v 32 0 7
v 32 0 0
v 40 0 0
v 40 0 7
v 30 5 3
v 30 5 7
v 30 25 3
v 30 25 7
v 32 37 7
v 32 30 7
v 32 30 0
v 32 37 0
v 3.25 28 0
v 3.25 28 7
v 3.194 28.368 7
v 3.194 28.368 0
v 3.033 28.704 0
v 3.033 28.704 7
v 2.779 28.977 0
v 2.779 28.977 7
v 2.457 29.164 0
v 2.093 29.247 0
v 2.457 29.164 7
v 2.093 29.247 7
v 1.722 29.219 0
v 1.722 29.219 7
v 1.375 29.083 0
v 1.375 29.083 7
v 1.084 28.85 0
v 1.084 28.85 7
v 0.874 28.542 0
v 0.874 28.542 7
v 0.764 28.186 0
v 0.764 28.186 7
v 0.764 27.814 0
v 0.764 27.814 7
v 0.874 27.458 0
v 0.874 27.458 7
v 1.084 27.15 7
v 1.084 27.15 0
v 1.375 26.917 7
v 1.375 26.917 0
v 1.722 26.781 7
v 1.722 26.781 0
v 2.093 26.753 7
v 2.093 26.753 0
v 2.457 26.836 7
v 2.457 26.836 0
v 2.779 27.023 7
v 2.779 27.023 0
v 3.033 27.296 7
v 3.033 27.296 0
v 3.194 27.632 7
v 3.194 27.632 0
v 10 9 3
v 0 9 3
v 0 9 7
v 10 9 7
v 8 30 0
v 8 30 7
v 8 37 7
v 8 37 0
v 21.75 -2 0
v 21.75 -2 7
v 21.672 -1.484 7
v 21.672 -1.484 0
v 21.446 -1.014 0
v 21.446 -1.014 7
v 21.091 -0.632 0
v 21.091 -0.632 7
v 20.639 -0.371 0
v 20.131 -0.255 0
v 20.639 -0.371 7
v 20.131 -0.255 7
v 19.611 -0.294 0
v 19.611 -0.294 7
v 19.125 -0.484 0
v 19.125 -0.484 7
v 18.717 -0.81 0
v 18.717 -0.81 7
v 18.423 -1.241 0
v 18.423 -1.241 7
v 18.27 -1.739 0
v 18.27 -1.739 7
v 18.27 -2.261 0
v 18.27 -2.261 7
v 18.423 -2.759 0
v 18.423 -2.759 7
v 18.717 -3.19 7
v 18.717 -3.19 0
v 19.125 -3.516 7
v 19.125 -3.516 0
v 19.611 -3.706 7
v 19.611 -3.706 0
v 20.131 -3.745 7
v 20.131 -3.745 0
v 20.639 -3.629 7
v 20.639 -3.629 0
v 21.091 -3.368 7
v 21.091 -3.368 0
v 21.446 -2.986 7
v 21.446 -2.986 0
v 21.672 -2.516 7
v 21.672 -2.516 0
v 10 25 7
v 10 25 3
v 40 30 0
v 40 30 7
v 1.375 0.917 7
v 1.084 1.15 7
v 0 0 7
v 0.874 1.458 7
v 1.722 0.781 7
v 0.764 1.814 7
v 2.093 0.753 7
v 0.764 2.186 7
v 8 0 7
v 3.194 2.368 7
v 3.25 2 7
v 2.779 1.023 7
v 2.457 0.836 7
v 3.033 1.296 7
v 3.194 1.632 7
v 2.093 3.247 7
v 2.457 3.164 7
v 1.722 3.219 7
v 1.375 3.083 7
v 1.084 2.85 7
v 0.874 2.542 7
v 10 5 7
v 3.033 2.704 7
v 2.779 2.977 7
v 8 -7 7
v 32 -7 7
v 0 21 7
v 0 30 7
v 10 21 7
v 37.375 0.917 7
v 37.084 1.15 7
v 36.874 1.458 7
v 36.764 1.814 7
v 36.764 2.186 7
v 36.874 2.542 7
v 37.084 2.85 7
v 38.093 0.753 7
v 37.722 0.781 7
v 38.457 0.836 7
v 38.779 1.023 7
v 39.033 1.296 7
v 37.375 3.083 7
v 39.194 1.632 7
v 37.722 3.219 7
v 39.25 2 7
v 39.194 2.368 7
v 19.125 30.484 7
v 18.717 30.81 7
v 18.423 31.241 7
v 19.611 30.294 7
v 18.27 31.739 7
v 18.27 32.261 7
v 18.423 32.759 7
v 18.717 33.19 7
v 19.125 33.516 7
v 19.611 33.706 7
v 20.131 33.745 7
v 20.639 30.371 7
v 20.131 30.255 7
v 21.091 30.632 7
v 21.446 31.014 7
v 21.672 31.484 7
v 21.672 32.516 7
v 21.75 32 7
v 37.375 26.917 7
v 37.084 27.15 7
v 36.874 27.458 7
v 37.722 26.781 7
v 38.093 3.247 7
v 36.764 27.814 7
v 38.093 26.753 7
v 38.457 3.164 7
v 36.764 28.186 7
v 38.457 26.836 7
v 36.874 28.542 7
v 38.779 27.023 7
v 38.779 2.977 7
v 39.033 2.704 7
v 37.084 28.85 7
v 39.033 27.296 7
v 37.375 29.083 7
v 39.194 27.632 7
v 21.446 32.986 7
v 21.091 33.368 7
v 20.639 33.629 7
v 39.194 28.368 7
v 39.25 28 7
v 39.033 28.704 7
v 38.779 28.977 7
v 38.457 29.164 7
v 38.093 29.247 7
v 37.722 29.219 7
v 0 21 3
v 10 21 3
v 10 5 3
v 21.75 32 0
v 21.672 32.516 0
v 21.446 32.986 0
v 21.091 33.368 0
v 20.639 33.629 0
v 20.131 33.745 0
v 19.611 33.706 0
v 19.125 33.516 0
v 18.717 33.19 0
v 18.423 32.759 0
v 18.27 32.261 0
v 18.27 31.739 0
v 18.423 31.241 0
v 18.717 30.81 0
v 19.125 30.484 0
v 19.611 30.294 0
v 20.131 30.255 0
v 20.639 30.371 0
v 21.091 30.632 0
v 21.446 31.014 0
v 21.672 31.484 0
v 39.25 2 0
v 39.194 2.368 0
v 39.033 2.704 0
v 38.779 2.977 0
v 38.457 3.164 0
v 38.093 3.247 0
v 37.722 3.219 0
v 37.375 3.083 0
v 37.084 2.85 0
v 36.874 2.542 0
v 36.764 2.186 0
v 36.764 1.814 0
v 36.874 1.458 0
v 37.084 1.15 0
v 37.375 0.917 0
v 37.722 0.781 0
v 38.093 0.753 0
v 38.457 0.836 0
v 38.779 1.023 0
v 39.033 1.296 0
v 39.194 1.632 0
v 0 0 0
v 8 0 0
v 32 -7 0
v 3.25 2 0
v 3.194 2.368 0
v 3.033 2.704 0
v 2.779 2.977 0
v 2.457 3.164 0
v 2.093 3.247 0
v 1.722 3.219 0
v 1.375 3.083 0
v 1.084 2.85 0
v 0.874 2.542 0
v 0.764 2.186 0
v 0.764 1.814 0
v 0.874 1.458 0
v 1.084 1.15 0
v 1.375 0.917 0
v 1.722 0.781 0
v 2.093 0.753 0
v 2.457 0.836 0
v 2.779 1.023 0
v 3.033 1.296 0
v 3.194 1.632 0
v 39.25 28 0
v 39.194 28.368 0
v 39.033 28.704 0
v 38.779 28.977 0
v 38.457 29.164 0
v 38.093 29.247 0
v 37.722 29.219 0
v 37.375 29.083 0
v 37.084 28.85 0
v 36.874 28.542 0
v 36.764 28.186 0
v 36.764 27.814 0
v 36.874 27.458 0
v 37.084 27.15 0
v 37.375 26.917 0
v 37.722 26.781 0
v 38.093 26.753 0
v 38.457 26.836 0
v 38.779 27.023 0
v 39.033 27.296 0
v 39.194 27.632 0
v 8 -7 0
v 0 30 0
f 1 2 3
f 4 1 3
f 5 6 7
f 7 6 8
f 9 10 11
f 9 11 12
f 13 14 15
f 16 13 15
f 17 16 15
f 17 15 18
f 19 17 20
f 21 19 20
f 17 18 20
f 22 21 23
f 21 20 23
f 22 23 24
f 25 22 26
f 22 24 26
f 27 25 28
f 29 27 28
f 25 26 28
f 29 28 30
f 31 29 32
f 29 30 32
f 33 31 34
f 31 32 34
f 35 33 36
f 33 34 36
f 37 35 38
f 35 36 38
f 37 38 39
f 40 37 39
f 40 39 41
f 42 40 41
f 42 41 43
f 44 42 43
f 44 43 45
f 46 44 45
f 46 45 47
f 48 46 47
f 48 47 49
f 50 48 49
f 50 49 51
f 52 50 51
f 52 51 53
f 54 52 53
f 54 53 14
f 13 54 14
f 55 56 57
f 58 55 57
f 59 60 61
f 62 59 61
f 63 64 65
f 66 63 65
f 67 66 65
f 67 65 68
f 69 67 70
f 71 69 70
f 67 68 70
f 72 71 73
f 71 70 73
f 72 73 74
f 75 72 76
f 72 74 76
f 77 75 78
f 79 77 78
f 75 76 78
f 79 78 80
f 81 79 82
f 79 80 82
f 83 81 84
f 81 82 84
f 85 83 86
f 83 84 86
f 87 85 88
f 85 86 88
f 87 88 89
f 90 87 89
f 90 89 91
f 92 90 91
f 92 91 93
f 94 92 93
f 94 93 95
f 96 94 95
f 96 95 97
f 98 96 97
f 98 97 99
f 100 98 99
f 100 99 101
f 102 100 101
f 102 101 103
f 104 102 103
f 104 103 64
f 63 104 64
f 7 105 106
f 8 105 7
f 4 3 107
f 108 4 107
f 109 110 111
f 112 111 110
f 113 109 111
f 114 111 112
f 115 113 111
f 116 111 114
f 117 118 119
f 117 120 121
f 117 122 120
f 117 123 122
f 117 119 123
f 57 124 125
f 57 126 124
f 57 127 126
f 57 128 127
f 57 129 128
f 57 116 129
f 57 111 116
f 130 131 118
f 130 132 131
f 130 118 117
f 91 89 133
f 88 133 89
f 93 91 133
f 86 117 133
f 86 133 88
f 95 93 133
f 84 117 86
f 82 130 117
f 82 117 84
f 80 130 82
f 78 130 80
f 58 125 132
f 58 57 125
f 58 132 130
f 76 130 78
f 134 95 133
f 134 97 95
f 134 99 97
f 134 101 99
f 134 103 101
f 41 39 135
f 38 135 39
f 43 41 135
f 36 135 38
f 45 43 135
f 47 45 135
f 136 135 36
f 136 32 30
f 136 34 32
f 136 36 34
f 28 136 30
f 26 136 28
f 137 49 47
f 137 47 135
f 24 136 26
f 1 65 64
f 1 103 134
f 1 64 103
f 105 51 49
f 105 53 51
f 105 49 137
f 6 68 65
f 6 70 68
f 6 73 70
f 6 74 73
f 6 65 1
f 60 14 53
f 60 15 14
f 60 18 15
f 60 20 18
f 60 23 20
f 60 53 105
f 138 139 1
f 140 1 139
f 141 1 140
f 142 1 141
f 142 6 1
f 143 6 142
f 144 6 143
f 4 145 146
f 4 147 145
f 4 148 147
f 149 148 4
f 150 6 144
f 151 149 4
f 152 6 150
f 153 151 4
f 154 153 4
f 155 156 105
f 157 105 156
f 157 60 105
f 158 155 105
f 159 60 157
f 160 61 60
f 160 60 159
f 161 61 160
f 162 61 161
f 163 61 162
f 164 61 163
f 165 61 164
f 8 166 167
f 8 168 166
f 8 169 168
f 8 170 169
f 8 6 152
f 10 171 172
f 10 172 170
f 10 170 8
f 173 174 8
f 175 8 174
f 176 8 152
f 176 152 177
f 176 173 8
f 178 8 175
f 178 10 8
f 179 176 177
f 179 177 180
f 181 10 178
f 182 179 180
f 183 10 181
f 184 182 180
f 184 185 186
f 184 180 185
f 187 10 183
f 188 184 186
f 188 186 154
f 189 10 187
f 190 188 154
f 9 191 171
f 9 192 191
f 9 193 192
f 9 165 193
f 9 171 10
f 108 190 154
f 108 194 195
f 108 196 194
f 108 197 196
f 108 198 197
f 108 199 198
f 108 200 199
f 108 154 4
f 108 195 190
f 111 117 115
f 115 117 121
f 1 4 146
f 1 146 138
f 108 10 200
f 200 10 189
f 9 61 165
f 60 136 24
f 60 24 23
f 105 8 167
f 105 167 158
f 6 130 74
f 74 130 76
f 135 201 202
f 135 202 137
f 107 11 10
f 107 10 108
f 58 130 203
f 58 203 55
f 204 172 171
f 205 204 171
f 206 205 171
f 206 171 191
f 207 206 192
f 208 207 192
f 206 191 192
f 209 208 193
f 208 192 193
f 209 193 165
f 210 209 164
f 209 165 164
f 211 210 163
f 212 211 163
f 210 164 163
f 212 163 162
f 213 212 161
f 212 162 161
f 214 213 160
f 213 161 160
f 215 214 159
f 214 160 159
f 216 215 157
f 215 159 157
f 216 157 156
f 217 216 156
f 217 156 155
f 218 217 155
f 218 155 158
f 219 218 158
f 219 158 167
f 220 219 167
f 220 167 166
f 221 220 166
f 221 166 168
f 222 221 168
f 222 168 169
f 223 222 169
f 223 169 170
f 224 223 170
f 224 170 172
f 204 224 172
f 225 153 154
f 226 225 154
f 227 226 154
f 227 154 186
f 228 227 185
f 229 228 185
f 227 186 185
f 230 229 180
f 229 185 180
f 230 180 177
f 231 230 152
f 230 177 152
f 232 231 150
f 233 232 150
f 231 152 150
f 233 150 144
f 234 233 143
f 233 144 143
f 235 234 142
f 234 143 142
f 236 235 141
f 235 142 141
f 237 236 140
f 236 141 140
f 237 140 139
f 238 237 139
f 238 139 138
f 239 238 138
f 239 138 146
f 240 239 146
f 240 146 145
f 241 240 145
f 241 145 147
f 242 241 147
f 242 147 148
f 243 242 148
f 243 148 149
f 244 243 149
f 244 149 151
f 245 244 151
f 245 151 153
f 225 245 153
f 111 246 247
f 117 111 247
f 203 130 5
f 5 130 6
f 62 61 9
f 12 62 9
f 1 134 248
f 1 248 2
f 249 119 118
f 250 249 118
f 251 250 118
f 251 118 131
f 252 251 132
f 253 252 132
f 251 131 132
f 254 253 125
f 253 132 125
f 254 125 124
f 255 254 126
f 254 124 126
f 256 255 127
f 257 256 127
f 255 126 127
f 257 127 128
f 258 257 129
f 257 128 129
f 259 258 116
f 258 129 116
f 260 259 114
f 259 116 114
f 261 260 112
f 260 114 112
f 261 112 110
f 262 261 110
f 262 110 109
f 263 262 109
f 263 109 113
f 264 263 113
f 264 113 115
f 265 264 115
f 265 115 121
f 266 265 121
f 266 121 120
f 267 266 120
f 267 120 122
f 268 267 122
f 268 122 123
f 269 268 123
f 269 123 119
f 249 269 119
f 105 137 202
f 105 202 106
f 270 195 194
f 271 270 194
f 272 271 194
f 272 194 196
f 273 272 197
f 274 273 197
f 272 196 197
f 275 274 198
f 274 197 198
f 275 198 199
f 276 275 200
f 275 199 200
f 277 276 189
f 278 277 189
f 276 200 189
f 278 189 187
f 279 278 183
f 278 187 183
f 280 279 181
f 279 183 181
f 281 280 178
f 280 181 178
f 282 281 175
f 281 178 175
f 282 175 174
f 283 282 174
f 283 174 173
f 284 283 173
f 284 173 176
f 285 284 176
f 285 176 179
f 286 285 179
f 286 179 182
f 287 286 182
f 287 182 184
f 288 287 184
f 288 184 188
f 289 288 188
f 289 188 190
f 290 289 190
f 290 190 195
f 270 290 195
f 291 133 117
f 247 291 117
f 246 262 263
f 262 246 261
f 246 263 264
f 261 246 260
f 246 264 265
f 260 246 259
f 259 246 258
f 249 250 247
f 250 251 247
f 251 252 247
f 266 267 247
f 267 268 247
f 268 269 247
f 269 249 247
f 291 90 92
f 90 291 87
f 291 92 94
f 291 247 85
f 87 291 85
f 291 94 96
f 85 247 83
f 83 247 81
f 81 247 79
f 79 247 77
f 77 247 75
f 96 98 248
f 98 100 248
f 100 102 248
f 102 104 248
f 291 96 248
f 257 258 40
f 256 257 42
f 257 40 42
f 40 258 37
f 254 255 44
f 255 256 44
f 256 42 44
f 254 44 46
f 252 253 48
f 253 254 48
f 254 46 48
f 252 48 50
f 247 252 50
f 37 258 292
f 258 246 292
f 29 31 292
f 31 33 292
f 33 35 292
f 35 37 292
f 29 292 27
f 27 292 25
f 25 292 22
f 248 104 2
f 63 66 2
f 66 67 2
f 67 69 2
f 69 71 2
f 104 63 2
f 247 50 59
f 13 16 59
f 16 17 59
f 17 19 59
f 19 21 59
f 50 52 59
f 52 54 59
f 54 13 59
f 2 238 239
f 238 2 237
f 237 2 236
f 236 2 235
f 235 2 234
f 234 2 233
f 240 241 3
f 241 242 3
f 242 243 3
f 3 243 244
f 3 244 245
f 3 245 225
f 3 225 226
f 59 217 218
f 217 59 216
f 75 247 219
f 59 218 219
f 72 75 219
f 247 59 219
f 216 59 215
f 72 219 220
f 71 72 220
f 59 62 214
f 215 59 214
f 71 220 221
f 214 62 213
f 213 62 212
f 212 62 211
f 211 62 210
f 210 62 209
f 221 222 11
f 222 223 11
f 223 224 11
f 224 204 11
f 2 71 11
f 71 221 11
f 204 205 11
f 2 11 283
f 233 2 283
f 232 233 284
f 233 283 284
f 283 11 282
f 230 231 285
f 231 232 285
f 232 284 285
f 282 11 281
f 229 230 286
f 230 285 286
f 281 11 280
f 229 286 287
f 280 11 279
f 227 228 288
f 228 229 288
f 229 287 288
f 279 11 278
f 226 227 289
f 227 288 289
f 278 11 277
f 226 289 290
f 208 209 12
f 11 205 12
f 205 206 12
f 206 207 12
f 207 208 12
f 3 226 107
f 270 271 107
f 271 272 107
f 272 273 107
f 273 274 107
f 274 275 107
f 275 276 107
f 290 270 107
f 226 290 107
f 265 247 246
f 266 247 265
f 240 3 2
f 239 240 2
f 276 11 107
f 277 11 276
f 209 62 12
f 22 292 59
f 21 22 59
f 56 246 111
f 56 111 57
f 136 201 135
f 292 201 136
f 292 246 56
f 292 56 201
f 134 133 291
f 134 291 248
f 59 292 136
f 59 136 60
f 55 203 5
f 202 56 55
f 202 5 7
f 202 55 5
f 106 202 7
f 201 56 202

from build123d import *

# Parameters (mm, degrees)
SKETCH1_W           = 40
SKETCH1_H           = 30
BOSS_EXTRUDE1_DEPTH = 7
SKETCH2_W           = 20
SKETCH2_H           = 20
CUT_EXTRUDE1_DEPTH  = 4
SKETCH3_W           = 4
SKETCH3_H           = 12
CUT_EXTRUDE2_DEPTH  = 26
SKETCH4_R           = 1.25
CUT_EXTRUDE3_DEPTH  = 8
SKETCH5_W           = 24
SKETCH5_H           = 7
BOSS_EXTRUDE2_DEPTH = 7
SKETCH6_R           = 1.75
CUT_EXTRUDE4_DEPTH  = 8


with BuildPart() as part:
    # Sketch1 → Boss-Extrude1 (new body)
    with BuildSketch(Plane.XY):
        with Locations((20, 15)):
            Rectangle(SKETCH1_W, SKETCH1_H)
    extrude(amount=BOSS_EXTRUDE1_DEPTH)

    # Sketch2 → Cut-Extrude1 (cut)
    with BuildSketch(Plane.XY.offset(7)):
        with Locations((20, 15)):
            Rectangle(SKETCH2_W, SKETCH2_H)
    extrude(amount=-CUT_EXTRUDE1_DEPTH, mode=Mode.SUBTRACT)

    # Sketch3 → Cut-Extrude2 (cut)
    with BuildSketch(Plane.ZY):
        with Locations((5, 15)):
            Rectangle(SKETCH3_W, SKETCH3_H)
    extrude(amount=-CUT_EXTRUDE2_DEPTH, mode=Mode.SUBTRACT)

    # Sketch4 → Cut-Extrude3 (cut, through all)
    with BuildSketch(Plane.XY.offset(7)):
        with Locations((2, 28)):
            Circle(SKETCH4_R)
        with Locations((38, 28)):
            Circle(SKETCH4_R)
        with Locations((38, 2)):
            Circle(SKETCH4_R)
        with Locations((2, 2)):
            Circle(SKETCH4_R)
    extrude(amount=-CUT_EXTRUDE3_DEPTH, mode=Mode.SUBTRACT)

    # Sketch5 → Boss-Extrude2 (add)
    with BuildSketch(Plane.XY.offset(7)):
        with Locations((20, 33.5)):
            Rectangle(SKETCH5_W, SKETCH5_H)
        with Locations((20, -3.5)):
            Rectangle(SKETCH5_W, SKETCH5_H)
    extrude(amount=-BOSS_EXTRUDE2_DEPTH)

    # Sketch6 → Cut-Extrude4 (cut, through all)
    with BuildSketch(Plane.XY.offset(7)):
        with Locations((20, -2)):
            Circle(SKETCH6_R)
        with Locations((20, 32)):
            Circle(SKETCH6_R)
    extrude(amount=-CUT_EXTRUDE4_DEPTH, mode=Mode.SUBTRACT)


solid = part.part
